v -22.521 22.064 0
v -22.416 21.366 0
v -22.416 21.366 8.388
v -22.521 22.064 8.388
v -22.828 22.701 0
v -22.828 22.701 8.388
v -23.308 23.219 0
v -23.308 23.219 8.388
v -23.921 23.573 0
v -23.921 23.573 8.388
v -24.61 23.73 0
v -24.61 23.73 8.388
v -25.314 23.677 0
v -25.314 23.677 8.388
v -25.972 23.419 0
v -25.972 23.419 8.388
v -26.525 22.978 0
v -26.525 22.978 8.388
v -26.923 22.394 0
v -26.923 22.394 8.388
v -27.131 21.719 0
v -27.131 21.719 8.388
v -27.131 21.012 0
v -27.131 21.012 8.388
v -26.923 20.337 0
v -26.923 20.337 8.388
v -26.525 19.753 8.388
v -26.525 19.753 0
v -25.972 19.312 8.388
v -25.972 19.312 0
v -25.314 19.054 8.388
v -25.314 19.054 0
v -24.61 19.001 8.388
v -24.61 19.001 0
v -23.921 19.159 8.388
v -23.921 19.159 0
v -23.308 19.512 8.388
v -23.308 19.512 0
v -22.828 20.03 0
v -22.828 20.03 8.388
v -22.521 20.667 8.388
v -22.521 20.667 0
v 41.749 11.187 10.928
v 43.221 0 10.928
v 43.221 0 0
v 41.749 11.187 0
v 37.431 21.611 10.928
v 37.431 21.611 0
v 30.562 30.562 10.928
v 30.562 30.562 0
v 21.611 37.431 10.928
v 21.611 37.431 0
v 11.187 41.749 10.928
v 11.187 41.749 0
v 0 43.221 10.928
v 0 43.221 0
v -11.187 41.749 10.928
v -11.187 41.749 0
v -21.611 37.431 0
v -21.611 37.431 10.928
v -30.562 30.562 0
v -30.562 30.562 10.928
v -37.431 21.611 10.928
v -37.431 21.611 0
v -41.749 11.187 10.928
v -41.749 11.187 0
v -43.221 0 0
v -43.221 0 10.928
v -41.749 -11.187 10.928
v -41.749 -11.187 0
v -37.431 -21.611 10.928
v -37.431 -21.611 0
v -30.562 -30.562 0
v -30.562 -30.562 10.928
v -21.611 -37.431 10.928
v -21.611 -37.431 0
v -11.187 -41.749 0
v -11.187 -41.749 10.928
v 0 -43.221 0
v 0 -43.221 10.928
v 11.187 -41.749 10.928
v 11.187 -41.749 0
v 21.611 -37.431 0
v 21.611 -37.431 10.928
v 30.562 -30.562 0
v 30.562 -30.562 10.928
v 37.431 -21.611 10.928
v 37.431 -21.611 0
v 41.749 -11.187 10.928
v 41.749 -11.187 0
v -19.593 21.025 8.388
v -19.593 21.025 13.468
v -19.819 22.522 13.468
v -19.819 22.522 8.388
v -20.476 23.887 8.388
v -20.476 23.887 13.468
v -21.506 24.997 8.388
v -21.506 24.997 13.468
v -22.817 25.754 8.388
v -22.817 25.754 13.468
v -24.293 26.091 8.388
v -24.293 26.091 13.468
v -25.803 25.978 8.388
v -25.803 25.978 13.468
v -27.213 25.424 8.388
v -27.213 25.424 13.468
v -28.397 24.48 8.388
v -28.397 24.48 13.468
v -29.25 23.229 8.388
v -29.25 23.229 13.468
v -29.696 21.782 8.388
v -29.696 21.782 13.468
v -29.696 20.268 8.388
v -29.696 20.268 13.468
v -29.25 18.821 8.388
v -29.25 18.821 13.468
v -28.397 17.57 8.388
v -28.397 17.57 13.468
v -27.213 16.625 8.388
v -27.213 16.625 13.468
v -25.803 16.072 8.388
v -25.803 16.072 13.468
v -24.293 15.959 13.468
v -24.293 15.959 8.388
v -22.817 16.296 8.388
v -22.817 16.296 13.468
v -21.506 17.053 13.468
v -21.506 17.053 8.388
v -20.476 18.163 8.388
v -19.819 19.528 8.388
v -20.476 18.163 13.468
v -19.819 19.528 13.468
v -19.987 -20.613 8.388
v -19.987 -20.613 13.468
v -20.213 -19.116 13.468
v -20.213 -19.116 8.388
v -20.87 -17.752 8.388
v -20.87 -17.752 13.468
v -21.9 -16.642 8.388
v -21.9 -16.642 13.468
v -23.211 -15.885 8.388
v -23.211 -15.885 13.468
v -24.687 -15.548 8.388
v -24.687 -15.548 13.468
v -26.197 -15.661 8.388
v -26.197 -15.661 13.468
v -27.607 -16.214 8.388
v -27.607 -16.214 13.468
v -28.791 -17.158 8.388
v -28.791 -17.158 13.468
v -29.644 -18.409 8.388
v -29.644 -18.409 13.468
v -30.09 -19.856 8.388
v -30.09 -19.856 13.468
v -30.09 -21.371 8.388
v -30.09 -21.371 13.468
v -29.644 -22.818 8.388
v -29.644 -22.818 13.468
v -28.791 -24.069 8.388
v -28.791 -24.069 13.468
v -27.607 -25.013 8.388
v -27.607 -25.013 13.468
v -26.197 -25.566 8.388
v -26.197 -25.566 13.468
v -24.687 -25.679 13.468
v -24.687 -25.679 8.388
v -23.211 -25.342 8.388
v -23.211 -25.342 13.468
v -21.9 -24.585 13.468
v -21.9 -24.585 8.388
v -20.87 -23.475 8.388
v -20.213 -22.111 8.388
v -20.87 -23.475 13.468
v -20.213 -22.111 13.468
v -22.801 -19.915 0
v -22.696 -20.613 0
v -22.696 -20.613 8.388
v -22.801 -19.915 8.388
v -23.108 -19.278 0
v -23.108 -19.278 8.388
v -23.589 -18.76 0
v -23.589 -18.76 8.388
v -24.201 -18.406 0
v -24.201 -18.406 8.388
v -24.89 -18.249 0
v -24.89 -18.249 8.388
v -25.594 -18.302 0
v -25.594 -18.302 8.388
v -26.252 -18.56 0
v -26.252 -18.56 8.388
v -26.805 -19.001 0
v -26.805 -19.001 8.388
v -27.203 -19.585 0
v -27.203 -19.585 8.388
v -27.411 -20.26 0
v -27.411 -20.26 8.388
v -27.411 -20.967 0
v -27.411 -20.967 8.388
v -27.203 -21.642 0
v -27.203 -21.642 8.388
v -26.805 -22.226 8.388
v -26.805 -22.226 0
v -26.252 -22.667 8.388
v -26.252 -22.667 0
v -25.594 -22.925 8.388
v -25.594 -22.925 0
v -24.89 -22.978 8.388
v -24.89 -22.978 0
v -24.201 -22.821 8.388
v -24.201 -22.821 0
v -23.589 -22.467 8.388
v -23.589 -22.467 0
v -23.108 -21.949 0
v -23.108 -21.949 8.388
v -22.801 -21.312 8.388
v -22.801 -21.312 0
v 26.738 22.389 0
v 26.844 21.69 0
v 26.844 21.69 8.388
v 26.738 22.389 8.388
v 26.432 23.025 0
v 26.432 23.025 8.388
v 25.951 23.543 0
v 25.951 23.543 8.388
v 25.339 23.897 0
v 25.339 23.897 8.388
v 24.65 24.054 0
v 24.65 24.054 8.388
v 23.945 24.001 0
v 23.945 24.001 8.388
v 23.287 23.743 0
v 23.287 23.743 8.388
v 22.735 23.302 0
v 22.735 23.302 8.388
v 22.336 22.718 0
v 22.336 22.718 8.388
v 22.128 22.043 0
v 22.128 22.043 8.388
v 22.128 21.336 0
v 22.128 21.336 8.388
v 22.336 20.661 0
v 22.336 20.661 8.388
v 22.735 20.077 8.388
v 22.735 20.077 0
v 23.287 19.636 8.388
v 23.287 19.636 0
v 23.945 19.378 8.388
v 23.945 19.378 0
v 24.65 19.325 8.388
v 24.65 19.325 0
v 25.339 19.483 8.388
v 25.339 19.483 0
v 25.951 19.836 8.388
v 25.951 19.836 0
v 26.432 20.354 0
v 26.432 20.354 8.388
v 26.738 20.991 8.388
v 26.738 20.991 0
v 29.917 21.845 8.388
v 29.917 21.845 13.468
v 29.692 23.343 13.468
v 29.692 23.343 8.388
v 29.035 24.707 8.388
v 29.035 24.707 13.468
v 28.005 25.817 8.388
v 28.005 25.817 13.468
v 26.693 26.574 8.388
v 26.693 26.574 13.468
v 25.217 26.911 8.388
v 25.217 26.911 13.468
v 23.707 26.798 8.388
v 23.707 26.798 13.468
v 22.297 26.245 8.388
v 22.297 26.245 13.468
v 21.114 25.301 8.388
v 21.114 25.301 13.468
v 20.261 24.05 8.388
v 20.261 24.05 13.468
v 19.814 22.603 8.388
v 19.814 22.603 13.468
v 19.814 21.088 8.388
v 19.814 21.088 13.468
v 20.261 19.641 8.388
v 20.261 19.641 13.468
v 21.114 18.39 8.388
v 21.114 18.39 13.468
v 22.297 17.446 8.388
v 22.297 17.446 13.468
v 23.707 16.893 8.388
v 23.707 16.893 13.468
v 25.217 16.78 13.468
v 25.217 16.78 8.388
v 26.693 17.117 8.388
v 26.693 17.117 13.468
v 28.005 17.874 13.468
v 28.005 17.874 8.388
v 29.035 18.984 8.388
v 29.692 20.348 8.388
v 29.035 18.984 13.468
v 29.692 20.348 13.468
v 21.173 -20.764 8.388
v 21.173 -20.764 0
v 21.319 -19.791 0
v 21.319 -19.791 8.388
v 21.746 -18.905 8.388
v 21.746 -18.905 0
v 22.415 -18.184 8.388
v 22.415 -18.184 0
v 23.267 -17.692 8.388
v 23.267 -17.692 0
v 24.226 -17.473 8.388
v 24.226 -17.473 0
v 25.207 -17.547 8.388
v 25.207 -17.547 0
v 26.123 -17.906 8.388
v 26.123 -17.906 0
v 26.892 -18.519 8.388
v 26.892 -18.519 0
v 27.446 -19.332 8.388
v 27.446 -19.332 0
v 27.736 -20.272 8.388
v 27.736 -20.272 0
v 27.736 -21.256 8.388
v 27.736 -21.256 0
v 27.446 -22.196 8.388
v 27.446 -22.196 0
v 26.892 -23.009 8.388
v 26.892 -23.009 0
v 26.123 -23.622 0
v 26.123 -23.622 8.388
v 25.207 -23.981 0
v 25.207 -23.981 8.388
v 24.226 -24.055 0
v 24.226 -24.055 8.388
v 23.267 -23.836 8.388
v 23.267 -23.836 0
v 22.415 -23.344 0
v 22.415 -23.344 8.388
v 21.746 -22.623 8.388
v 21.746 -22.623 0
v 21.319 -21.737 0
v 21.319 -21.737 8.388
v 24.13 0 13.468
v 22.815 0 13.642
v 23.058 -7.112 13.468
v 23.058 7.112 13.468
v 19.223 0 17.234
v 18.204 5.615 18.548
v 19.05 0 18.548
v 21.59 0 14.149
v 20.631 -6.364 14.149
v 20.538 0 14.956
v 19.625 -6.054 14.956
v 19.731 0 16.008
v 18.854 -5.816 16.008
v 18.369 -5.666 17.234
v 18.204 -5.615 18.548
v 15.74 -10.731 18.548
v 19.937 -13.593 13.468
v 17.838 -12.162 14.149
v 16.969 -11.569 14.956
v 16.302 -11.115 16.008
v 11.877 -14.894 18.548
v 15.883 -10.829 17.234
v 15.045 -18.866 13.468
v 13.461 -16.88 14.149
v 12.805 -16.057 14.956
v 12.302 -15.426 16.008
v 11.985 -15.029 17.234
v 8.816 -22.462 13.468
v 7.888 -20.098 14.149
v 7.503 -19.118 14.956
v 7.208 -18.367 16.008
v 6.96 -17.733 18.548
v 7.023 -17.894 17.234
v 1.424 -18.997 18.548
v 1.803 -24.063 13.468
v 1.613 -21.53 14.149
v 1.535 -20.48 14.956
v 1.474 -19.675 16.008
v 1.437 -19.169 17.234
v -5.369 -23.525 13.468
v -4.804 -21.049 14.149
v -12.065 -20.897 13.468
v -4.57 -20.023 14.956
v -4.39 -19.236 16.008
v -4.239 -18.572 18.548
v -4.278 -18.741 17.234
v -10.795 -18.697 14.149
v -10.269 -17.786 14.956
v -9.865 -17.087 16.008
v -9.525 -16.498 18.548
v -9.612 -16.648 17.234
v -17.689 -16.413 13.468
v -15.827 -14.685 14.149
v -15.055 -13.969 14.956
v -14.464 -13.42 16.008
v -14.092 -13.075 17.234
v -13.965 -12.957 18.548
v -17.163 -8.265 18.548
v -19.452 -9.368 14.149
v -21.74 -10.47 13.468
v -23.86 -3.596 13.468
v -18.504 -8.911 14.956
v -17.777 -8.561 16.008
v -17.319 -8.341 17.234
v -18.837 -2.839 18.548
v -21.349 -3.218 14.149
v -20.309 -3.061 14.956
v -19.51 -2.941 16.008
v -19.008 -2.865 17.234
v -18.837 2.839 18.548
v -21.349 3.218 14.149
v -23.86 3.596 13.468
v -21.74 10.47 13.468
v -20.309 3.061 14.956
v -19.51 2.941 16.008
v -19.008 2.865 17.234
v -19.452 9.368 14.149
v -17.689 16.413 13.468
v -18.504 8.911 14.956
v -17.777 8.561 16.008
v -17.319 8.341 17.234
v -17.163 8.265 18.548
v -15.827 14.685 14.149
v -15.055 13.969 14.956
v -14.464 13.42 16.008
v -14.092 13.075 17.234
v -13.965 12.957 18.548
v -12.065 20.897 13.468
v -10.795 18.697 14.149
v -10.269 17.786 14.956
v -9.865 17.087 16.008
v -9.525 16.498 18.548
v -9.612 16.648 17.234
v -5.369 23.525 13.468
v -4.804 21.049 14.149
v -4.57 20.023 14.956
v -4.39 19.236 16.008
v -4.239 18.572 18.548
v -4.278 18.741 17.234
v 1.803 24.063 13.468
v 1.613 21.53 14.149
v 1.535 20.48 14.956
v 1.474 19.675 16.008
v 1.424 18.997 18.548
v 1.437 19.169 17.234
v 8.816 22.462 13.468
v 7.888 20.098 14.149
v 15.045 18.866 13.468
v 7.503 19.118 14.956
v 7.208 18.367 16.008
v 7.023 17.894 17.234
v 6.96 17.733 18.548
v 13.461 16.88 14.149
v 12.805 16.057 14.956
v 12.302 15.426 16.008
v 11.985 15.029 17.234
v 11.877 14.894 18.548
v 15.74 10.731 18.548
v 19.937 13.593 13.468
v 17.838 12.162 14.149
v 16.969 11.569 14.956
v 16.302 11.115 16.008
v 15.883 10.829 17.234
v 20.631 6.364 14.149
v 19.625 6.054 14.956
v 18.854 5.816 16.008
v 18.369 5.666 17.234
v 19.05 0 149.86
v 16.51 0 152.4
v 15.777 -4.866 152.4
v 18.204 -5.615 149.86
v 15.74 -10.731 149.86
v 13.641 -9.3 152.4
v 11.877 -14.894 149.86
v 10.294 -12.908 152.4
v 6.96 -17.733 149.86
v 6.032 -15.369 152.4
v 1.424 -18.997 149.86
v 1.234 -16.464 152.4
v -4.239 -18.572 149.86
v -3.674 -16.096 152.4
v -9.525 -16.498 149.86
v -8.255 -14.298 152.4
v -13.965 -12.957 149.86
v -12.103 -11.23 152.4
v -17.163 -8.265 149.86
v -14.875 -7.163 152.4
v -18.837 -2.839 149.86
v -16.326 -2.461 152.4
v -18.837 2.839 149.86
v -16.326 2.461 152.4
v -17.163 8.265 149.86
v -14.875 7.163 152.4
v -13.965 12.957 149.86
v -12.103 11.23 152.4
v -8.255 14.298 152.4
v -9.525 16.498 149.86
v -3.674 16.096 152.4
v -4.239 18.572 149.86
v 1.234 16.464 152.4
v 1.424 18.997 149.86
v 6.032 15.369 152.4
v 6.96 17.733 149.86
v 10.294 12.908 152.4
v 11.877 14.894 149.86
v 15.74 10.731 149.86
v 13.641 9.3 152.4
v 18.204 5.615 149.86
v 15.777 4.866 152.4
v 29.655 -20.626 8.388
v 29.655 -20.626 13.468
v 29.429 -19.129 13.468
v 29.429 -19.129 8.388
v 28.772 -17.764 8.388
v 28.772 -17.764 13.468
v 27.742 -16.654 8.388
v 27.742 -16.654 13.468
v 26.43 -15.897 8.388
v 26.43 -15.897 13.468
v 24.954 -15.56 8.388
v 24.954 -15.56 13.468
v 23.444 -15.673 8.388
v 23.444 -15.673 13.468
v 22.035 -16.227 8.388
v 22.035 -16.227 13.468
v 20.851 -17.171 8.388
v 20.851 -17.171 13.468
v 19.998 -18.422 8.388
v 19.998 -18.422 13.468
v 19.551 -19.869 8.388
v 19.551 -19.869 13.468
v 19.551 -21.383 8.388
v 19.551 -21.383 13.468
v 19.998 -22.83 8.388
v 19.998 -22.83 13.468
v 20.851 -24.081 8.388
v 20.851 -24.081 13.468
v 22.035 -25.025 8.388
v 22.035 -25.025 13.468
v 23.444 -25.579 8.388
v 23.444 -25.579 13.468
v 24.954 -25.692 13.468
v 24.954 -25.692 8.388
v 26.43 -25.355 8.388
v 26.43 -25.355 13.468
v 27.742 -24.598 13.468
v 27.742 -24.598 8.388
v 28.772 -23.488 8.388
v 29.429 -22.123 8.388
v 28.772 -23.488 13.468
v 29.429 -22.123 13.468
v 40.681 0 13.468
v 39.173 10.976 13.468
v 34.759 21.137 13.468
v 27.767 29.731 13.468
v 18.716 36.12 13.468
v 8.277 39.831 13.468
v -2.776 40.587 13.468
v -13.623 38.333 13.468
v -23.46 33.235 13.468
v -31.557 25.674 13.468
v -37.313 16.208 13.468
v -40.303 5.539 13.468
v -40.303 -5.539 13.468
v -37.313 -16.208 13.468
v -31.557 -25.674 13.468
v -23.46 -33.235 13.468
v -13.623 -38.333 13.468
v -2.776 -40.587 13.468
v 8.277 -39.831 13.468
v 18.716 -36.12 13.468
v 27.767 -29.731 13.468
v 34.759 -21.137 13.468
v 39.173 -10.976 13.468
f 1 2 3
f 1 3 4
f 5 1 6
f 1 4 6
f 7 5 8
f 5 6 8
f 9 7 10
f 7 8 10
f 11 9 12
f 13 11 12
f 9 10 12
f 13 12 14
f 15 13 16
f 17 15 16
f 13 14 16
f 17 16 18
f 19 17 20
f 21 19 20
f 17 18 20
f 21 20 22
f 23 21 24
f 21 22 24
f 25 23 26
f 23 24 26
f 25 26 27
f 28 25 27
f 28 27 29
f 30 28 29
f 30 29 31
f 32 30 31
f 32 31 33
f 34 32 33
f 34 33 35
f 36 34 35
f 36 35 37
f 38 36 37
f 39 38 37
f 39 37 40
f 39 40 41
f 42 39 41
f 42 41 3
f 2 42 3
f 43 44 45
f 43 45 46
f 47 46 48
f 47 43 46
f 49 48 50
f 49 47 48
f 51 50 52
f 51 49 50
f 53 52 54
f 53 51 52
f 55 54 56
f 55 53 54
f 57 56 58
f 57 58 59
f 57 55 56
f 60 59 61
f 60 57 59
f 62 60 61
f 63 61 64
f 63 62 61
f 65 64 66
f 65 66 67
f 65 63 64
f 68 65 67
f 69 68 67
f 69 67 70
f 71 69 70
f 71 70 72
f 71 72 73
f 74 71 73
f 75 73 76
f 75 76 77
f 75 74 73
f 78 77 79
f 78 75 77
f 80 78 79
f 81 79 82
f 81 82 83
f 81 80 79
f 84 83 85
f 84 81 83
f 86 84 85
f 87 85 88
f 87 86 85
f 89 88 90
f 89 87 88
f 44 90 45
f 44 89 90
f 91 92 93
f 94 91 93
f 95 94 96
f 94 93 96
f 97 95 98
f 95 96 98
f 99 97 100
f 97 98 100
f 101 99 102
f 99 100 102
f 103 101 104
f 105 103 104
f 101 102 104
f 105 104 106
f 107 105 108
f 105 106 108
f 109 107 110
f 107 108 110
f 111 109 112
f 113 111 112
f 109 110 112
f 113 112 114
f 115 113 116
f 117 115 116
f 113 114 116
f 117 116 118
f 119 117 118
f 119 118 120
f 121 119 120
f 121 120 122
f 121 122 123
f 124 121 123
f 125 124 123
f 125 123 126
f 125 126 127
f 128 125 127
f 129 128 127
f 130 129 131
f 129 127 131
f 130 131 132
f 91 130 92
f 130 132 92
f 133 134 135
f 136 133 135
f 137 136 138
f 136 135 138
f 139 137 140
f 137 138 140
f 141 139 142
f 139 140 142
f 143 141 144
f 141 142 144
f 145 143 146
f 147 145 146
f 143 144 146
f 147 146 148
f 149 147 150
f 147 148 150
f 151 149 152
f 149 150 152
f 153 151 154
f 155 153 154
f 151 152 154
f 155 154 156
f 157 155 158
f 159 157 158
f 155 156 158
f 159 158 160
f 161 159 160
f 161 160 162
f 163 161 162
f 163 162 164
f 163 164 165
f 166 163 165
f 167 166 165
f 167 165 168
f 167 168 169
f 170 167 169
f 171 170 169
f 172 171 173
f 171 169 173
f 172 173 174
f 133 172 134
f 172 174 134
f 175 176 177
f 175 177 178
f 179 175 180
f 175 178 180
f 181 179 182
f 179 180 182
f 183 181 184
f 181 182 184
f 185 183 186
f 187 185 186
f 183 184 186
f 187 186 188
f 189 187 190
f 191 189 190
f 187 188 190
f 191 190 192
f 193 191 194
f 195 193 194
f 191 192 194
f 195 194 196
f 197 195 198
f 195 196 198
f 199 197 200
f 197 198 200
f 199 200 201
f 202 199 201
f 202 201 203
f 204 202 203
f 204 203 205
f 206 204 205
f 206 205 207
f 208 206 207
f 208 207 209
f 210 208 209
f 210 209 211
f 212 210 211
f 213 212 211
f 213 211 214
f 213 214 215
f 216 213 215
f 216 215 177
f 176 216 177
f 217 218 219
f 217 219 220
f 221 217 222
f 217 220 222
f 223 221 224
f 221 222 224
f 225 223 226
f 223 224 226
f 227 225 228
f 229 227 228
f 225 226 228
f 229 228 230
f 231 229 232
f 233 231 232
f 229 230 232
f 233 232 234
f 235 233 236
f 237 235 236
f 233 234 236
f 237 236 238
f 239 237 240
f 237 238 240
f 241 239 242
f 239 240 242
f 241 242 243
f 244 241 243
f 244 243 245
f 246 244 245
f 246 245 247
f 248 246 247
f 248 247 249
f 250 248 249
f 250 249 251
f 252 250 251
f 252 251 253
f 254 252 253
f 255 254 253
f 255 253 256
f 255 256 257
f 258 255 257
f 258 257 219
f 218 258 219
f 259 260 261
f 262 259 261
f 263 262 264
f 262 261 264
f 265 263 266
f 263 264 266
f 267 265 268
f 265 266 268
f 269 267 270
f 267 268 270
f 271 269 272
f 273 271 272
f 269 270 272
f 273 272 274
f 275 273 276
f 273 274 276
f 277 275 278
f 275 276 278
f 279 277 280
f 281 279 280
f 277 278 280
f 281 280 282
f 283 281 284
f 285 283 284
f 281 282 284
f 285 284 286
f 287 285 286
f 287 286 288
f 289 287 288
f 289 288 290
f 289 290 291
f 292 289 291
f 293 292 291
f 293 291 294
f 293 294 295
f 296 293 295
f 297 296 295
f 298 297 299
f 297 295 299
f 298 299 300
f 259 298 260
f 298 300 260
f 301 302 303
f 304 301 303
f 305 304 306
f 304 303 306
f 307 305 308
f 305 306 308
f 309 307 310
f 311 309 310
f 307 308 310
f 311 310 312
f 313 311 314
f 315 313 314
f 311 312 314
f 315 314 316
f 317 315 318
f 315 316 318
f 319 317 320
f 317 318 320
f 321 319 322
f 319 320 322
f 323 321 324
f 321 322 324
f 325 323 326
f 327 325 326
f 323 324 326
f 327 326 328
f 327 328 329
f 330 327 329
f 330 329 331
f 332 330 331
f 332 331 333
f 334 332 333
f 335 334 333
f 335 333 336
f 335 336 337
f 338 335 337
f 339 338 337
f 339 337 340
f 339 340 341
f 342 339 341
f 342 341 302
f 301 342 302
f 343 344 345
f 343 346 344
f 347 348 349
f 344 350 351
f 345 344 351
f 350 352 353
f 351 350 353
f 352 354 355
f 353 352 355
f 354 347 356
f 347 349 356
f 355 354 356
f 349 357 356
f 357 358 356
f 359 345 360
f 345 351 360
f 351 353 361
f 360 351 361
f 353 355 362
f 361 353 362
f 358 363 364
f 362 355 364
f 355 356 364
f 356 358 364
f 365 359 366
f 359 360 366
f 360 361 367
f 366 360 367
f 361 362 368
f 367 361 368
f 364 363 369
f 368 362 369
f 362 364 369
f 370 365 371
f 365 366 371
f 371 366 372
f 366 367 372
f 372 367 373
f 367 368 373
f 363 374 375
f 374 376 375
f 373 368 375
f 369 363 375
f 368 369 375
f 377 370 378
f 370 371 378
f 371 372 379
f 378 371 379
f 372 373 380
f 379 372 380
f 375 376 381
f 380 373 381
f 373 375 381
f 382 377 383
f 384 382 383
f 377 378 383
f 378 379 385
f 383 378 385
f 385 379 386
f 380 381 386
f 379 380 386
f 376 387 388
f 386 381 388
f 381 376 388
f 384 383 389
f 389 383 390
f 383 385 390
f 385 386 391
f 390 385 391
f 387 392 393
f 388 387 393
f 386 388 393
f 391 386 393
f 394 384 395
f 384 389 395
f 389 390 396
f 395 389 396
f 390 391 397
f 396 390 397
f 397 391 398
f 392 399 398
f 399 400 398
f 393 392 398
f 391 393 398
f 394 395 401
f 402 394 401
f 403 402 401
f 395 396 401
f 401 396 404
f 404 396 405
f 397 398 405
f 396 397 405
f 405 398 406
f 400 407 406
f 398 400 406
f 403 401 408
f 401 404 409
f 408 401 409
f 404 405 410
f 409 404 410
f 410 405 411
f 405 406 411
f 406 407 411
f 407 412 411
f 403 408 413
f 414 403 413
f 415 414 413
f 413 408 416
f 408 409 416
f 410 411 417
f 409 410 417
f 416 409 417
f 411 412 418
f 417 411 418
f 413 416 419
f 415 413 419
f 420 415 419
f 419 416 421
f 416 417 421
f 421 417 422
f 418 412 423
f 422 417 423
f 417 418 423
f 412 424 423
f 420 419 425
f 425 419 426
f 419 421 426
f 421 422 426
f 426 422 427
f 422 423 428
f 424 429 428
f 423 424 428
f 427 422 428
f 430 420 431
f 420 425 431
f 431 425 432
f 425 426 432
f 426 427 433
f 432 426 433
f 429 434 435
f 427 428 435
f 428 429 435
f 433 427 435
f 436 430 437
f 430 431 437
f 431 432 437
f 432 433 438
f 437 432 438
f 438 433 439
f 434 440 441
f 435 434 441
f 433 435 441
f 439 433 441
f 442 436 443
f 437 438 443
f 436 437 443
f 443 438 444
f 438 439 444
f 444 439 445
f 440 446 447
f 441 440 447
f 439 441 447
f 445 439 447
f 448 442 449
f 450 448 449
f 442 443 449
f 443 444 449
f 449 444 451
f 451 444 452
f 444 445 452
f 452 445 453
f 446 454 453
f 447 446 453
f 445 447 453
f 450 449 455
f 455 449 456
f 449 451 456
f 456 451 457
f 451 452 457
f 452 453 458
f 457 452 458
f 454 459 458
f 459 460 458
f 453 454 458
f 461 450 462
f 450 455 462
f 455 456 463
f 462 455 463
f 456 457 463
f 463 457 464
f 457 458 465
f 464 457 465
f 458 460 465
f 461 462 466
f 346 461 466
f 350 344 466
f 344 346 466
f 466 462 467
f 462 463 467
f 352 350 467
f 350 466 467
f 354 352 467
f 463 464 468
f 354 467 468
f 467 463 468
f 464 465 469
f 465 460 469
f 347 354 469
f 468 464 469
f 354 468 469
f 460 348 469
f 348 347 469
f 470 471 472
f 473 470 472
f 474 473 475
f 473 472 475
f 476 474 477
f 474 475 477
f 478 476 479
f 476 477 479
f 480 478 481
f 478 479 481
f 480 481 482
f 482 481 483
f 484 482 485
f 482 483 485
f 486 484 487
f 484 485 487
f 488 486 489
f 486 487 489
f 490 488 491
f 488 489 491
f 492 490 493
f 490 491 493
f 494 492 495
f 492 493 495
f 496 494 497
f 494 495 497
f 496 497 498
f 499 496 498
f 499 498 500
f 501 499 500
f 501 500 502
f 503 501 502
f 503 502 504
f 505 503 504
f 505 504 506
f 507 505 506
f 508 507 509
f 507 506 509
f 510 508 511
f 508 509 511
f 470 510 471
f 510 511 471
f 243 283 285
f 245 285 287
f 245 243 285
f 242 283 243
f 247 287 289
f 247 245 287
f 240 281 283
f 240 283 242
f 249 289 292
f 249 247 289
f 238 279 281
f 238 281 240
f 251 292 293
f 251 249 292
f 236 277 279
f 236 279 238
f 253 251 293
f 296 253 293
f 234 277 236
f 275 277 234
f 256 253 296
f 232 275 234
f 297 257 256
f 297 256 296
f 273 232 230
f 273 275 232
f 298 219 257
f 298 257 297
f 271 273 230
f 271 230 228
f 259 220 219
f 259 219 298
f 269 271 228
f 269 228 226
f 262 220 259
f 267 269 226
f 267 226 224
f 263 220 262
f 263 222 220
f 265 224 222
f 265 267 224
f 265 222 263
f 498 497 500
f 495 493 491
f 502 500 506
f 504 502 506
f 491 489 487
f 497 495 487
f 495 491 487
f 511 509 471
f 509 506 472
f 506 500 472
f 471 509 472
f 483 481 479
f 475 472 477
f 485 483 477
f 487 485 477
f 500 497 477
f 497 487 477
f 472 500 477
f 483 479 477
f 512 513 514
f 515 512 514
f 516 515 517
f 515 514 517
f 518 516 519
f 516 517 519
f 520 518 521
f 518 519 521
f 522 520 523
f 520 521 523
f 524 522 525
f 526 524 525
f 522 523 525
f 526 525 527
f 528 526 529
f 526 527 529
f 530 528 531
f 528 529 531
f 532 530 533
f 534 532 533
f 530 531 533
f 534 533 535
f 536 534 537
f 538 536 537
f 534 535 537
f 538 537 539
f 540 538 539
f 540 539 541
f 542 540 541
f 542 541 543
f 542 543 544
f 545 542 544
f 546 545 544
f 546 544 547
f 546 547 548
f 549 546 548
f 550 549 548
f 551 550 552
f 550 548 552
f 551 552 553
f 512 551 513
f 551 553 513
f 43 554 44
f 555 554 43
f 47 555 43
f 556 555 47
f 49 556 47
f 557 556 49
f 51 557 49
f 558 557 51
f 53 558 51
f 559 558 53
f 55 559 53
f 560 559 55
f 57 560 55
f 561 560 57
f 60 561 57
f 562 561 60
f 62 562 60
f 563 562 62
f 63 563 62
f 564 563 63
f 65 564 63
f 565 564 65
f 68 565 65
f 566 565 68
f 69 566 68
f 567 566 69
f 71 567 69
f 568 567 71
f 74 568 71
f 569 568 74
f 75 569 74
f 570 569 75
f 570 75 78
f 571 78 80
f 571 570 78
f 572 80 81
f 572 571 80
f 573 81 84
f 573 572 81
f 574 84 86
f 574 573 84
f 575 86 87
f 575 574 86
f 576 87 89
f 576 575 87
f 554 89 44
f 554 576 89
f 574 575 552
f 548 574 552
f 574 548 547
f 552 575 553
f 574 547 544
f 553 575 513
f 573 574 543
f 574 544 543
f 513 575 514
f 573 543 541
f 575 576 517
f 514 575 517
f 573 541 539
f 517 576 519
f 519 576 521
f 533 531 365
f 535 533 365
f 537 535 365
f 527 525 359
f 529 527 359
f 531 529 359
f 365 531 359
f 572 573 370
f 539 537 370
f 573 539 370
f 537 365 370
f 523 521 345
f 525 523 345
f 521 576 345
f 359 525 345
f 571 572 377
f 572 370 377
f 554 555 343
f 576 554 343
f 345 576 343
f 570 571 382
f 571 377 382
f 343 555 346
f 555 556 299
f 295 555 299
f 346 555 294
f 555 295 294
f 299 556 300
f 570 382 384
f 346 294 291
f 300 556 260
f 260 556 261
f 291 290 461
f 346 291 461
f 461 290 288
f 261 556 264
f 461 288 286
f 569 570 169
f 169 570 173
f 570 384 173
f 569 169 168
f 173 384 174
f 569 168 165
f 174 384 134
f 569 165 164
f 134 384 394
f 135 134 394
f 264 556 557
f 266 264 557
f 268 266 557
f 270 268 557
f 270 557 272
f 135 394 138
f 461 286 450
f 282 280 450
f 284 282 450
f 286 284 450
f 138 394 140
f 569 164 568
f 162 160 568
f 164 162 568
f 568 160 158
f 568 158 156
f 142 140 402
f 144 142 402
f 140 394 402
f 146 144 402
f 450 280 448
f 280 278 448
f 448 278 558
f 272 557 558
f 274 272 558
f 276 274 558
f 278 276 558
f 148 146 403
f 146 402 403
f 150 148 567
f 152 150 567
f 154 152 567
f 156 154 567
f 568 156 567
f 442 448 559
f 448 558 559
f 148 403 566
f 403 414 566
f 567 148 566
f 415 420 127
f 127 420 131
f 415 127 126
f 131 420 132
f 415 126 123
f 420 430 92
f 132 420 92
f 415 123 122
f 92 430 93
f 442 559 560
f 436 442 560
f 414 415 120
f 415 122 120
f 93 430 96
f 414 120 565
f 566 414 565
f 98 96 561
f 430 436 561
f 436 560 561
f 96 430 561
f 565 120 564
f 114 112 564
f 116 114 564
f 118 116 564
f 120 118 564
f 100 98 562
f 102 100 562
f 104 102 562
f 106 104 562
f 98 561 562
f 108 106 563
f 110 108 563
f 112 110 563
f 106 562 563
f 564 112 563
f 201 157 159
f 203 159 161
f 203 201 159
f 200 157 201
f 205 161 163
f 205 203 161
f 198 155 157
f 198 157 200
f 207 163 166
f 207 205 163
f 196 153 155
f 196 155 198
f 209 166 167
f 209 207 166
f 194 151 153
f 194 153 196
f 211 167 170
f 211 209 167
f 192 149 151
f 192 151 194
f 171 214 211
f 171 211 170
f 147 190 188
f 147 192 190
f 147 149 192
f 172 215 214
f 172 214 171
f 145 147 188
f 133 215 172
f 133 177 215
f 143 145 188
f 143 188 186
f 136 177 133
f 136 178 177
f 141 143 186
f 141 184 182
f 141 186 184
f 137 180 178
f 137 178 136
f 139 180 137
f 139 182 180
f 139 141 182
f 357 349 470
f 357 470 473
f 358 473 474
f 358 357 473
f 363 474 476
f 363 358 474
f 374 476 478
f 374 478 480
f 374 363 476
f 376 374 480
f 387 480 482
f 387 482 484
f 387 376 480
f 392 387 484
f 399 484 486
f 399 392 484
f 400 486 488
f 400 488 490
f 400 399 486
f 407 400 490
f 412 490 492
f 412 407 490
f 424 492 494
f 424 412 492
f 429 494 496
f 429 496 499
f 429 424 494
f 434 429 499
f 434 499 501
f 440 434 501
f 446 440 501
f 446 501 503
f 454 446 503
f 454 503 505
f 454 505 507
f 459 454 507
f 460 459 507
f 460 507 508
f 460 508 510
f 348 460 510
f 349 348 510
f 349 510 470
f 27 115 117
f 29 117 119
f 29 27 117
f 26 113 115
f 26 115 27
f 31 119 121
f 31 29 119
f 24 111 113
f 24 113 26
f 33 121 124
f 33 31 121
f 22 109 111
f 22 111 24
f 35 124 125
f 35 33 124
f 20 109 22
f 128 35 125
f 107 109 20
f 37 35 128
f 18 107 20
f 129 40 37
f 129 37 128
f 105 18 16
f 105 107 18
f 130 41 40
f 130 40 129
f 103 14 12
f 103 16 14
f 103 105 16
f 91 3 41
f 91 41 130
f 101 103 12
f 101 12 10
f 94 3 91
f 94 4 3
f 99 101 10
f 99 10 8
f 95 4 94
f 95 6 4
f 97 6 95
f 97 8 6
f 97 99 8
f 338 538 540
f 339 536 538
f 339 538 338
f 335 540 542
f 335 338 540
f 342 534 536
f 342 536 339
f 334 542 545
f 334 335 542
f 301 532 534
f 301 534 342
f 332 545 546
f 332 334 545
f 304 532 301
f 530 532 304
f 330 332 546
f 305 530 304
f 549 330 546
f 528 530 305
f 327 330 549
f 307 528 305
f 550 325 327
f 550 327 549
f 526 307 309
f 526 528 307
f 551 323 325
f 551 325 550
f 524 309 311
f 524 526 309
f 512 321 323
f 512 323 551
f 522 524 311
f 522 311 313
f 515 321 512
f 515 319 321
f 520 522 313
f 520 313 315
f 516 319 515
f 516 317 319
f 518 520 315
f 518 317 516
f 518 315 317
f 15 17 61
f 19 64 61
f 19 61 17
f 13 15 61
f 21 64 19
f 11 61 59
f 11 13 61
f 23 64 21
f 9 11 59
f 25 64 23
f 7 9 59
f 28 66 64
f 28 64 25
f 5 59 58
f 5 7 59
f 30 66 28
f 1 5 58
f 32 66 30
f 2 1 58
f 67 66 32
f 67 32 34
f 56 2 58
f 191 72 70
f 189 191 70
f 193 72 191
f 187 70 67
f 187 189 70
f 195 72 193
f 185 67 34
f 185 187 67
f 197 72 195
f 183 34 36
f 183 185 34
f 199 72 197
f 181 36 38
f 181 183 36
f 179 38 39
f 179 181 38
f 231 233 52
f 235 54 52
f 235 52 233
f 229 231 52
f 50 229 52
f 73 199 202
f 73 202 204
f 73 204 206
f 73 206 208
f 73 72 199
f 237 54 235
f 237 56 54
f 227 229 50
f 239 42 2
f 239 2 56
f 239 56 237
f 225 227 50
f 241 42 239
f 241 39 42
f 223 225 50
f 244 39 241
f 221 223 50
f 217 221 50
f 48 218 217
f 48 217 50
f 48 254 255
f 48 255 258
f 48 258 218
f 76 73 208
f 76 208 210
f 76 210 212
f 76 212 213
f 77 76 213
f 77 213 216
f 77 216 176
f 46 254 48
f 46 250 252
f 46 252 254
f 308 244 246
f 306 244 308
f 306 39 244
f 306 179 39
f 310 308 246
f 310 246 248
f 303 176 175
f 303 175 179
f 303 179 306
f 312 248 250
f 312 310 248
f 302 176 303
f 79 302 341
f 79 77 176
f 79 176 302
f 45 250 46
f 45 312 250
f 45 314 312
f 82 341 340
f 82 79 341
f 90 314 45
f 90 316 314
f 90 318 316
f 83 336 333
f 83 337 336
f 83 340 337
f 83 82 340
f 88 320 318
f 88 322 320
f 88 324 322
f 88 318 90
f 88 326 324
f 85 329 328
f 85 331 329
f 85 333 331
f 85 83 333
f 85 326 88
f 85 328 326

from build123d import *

# Parameters (mm, degrees)
F0_W     = 43.2214178145
F0_H     = 13.4684350342
F2_R     = 19.05
F3_DEPTH = 152.4
F4_R     = 5.08
F5_DEPTH = 5.08
F6_R     = 2.3709627479
F7_DEPTH = 25.4
F8_SIZE  = 2.54
F9_R     = 5.08
F10_D    = 6.6


with BuildPart() as f1:
    # F0 (on Front) → F1 (revolve)
    with BuildSketch(Plane.XZ):
        with Locations((21.6107089072, 6.7342175171)):
            Rectangle(F0_W, F0_H)
    revolve(axis=Axis((0, 0, 6.7342175171), (0, 0, 1)))

    # F2 (on face) → F3 (join)
    with BuildSketch(Plane(origin=(0, 0, 0), x_dir=(1, 0, 0), z_dir=(0, 0, -1))):
        Circle(F2_R)
    extrude(amount=-F3_DEPTH)

    # F4 (on face) → F5 (cut)
    with BuildSketch(Plane.XY.offset(13.4684350342)):
        with Locations((-24.6729586924, 21.0248965081)):
            Circle(F4_R)
        with Locations((24.8374585062, 21.8454711139)):
            Circle(F4_R)
        with Locations((-25.066871196, -20.6134561449)):
            Circle(F4_R)
        with Locations((24.5745163411, -20.6259563565)):
            Circle(F4_R)
    extrude(amount=-F5_DEPTH, mode=Mode.SUBTRACT)

    # F6 (on face) → F7 (cut)
    with BuildSketch(Plane.XY.offset(13.4684350342)):
        with Locations((-25.066871196, -20.6134561449)):
            Circle(F6_R)
        with Locations((24.4725923985, -20.7640305161)):
            Circle(F6_R)
        with Locations((24.4725923985, 21.6897111386)):
            Circle(F6_R)
        with Locations((-24.7867107391, 21.3656388223)):
            Circle(F6_R)
    extrude(amount=-F7_DEPTH, mode=Mode.SUBTRACT)

    # F8
    f8_edges = [f1.edges().sort_by_distance(p)[0] for p in [
        (-19.05, 0, 152.4),
        (-43.221418, 0, 13.468435),
    ]]
    chamfer(f8_edges, length=F8_SIZE)

    # F9
    f9_edges = [f1.edges().sort_by_distance(p)[0] for p in [
        (-19.05, 0, 13.468435),
    ]]
    fillet(f9_edges, radius=F9_R)

    # F10 (through all)
    with Locations(Plane.XY.offset(13.4684350342)):
        with Locations((24.4725923985, -20.7640305161)):
            Hole(F10_D / 2)


solid = f1.part
